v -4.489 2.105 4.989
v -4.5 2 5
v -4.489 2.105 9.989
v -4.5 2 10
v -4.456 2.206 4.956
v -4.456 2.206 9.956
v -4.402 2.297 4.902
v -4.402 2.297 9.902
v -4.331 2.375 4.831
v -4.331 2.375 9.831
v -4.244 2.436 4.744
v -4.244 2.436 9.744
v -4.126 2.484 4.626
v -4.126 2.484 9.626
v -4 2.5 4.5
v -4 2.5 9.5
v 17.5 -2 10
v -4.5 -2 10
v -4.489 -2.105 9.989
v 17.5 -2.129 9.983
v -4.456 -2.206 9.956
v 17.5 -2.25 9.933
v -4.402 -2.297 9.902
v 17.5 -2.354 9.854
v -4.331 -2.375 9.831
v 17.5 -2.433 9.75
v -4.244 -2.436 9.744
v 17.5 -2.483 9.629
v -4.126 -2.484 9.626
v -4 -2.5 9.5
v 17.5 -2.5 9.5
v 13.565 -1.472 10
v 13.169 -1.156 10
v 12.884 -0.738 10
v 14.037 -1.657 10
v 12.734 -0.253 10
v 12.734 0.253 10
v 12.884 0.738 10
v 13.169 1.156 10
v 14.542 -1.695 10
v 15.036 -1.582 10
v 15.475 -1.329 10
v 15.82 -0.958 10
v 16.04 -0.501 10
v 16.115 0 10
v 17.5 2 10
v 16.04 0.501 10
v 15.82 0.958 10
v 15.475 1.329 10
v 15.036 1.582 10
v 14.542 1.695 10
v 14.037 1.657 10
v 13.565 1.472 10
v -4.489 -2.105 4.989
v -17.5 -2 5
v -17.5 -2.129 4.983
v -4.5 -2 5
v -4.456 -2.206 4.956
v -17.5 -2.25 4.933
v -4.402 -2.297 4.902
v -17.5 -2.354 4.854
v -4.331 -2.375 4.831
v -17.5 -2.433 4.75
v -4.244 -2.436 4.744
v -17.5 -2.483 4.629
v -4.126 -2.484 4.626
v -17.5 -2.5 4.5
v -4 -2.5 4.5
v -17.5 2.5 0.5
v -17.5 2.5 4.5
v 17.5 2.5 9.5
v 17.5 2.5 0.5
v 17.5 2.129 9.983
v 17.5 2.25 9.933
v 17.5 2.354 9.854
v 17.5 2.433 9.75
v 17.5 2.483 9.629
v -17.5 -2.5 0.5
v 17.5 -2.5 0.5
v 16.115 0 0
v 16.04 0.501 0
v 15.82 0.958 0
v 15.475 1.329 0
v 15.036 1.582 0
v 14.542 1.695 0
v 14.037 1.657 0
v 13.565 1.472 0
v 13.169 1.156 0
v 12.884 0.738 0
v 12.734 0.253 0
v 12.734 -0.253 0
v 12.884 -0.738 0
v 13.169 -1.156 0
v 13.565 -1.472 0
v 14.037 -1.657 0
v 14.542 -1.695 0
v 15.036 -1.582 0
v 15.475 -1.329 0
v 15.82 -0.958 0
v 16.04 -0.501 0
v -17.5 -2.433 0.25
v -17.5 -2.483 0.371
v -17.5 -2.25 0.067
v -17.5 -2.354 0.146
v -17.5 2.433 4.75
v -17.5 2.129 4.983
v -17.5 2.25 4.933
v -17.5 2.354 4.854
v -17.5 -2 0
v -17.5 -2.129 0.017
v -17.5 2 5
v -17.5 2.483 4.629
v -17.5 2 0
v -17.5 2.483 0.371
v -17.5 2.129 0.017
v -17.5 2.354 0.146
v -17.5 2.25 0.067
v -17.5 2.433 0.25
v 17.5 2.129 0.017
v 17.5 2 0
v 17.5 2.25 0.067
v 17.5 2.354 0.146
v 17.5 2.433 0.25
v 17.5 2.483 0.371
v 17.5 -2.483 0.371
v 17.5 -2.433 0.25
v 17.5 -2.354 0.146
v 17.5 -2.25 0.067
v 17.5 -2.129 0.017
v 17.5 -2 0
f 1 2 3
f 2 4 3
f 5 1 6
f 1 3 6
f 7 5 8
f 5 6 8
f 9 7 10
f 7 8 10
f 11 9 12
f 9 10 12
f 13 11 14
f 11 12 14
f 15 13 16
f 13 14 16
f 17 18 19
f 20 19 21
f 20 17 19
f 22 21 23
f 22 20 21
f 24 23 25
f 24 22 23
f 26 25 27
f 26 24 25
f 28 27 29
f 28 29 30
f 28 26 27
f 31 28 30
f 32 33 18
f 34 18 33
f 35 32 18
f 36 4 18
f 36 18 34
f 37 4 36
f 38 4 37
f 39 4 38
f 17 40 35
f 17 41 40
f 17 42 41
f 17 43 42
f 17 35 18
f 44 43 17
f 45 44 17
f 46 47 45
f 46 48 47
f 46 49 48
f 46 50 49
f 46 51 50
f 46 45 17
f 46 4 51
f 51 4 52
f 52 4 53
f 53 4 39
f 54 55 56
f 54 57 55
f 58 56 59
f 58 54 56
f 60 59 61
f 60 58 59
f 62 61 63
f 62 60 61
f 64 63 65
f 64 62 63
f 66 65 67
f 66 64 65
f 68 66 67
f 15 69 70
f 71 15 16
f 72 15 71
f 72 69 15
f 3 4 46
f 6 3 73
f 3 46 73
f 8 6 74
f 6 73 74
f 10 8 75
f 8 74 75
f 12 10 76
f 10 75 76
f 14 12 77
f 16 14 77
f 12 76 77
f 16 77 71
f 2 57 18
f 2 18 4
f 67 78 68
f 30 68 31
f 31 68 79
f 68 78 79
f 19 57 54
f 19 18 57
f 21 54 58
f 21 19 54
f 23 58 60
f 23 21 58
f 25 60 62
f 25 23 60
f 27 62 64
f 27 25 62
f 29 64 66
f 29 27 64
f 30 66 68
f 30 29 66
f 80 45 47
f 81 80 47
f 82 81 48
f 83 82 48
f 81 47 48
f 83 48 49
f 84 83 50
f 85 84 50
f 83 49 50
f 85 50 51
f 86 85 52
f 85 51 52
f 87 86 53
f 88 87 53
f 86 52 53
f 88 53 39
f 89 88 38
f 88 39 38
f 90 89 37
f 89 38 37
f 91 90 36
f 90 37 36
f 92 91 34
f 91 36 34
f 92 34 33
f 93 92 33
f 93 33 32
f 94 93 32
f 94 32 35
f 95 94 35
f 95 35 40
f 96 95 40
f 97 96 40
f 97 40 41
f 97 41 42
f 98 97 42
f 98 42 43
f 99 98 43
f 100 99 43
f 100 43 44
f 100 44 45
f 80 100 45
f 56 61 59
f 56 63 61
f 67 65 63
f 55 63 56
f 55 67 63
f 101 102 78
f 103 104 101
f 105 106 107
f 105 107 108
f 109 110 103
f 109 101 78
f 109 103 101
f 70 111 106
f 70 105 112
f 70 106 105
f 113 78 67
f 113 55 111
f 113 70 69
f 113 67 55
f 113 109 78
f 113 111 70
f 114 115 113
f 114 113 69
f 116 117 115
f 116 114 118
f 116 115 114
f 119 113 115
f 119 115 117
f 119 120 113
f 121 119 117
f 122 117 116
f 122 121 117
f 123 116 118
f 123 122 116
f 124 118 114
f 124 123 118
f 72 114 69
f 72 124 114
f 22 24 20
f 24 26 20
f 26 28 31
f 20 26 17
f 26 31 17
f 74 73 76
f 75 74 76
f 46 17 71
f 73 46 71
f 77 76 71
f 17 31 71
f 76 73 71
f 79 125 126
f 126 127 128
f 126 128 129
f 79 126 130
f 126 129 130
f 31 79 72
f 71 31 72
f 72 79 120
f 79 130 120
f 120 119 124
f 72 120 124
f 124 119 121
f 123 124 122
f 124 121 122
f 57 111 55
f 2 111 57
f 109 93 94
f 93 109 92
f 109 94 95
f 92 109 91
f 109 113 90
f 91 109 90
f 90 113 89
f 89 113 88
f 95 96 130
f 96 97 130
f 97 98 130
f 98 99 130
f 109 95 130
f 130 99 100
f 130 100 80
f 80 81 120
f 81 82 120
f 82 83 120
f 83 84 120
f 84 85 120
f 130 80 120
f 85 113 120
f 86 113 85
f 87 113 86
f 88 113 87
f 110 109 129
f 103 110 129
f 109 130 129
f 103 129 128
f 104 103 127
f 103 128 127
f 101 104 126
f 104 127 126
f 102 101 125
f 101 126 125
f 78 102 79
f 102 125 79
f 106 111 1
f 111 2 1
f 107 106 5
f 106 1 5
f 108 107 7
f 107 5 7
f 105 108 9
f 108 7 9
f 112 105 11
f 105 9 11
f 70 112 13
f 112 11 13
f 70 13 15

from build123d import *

# Parameters (mm, degrees)
SKETCH1_W            = 35
SKETCH1_H            = 5
BOSS_EXTRUDE1_DEPTH  = 5
SKETCH3_W            = 22
SKETCH3_H            = 5
BOSS_EXTRUDE3_DEPTH  = 5
FILLET1_R            = 0.5
M3_CLEARANCE_HOLE1_D = 3.4


with BuildPart() as part:
    # Sketch1 → Boss-Extrude1 (new body)
    with BuildSketch(Plane.XY):
        Rectangle(SKETCH1_W, SKETCH1_H)
    extrude(amount=BOSS_EXTRUDE1_DEPTH)

    # Sketch3 → Boss-Extrude3 (add)
    with BuildSketch(Plane.XY.offset(5)):
        with Locations((6.5, 0)):
            Rectangle(SKETCH3_W, SKETCH3_H)
    extrude(amount=BOSS_EXTRUDE3_DEPTH)

    # Fillet1
    fillet1_edges = [part.edges().sort_by_distance(p)[0] for p in [
        (-11, 2.5, 5),
        (-4.5, 2.5, 7.5),
        (-4.5, -2.5, 7.5),
        (-11, -2.5, 5),
        (6.5, 2.5, 10),
        (6.5, -2.5, 10),
        (0, -2.5, 0),
        (0, 2.5, 0),
    ]]
    fillet(fillet1_edges, radius=FILLET1_R)

    # M3 Clearance Hole1 (through all)
    with Locations(Plane(origin=(14.415303624, 0, 0), x_dir=(-1, 0, 0), z_dir=(0, 0, -1))):
        with Locations((0, 0)):
            Hole(M3_CLEARANCE_HOLE1_D / 2)


solid = part.part
